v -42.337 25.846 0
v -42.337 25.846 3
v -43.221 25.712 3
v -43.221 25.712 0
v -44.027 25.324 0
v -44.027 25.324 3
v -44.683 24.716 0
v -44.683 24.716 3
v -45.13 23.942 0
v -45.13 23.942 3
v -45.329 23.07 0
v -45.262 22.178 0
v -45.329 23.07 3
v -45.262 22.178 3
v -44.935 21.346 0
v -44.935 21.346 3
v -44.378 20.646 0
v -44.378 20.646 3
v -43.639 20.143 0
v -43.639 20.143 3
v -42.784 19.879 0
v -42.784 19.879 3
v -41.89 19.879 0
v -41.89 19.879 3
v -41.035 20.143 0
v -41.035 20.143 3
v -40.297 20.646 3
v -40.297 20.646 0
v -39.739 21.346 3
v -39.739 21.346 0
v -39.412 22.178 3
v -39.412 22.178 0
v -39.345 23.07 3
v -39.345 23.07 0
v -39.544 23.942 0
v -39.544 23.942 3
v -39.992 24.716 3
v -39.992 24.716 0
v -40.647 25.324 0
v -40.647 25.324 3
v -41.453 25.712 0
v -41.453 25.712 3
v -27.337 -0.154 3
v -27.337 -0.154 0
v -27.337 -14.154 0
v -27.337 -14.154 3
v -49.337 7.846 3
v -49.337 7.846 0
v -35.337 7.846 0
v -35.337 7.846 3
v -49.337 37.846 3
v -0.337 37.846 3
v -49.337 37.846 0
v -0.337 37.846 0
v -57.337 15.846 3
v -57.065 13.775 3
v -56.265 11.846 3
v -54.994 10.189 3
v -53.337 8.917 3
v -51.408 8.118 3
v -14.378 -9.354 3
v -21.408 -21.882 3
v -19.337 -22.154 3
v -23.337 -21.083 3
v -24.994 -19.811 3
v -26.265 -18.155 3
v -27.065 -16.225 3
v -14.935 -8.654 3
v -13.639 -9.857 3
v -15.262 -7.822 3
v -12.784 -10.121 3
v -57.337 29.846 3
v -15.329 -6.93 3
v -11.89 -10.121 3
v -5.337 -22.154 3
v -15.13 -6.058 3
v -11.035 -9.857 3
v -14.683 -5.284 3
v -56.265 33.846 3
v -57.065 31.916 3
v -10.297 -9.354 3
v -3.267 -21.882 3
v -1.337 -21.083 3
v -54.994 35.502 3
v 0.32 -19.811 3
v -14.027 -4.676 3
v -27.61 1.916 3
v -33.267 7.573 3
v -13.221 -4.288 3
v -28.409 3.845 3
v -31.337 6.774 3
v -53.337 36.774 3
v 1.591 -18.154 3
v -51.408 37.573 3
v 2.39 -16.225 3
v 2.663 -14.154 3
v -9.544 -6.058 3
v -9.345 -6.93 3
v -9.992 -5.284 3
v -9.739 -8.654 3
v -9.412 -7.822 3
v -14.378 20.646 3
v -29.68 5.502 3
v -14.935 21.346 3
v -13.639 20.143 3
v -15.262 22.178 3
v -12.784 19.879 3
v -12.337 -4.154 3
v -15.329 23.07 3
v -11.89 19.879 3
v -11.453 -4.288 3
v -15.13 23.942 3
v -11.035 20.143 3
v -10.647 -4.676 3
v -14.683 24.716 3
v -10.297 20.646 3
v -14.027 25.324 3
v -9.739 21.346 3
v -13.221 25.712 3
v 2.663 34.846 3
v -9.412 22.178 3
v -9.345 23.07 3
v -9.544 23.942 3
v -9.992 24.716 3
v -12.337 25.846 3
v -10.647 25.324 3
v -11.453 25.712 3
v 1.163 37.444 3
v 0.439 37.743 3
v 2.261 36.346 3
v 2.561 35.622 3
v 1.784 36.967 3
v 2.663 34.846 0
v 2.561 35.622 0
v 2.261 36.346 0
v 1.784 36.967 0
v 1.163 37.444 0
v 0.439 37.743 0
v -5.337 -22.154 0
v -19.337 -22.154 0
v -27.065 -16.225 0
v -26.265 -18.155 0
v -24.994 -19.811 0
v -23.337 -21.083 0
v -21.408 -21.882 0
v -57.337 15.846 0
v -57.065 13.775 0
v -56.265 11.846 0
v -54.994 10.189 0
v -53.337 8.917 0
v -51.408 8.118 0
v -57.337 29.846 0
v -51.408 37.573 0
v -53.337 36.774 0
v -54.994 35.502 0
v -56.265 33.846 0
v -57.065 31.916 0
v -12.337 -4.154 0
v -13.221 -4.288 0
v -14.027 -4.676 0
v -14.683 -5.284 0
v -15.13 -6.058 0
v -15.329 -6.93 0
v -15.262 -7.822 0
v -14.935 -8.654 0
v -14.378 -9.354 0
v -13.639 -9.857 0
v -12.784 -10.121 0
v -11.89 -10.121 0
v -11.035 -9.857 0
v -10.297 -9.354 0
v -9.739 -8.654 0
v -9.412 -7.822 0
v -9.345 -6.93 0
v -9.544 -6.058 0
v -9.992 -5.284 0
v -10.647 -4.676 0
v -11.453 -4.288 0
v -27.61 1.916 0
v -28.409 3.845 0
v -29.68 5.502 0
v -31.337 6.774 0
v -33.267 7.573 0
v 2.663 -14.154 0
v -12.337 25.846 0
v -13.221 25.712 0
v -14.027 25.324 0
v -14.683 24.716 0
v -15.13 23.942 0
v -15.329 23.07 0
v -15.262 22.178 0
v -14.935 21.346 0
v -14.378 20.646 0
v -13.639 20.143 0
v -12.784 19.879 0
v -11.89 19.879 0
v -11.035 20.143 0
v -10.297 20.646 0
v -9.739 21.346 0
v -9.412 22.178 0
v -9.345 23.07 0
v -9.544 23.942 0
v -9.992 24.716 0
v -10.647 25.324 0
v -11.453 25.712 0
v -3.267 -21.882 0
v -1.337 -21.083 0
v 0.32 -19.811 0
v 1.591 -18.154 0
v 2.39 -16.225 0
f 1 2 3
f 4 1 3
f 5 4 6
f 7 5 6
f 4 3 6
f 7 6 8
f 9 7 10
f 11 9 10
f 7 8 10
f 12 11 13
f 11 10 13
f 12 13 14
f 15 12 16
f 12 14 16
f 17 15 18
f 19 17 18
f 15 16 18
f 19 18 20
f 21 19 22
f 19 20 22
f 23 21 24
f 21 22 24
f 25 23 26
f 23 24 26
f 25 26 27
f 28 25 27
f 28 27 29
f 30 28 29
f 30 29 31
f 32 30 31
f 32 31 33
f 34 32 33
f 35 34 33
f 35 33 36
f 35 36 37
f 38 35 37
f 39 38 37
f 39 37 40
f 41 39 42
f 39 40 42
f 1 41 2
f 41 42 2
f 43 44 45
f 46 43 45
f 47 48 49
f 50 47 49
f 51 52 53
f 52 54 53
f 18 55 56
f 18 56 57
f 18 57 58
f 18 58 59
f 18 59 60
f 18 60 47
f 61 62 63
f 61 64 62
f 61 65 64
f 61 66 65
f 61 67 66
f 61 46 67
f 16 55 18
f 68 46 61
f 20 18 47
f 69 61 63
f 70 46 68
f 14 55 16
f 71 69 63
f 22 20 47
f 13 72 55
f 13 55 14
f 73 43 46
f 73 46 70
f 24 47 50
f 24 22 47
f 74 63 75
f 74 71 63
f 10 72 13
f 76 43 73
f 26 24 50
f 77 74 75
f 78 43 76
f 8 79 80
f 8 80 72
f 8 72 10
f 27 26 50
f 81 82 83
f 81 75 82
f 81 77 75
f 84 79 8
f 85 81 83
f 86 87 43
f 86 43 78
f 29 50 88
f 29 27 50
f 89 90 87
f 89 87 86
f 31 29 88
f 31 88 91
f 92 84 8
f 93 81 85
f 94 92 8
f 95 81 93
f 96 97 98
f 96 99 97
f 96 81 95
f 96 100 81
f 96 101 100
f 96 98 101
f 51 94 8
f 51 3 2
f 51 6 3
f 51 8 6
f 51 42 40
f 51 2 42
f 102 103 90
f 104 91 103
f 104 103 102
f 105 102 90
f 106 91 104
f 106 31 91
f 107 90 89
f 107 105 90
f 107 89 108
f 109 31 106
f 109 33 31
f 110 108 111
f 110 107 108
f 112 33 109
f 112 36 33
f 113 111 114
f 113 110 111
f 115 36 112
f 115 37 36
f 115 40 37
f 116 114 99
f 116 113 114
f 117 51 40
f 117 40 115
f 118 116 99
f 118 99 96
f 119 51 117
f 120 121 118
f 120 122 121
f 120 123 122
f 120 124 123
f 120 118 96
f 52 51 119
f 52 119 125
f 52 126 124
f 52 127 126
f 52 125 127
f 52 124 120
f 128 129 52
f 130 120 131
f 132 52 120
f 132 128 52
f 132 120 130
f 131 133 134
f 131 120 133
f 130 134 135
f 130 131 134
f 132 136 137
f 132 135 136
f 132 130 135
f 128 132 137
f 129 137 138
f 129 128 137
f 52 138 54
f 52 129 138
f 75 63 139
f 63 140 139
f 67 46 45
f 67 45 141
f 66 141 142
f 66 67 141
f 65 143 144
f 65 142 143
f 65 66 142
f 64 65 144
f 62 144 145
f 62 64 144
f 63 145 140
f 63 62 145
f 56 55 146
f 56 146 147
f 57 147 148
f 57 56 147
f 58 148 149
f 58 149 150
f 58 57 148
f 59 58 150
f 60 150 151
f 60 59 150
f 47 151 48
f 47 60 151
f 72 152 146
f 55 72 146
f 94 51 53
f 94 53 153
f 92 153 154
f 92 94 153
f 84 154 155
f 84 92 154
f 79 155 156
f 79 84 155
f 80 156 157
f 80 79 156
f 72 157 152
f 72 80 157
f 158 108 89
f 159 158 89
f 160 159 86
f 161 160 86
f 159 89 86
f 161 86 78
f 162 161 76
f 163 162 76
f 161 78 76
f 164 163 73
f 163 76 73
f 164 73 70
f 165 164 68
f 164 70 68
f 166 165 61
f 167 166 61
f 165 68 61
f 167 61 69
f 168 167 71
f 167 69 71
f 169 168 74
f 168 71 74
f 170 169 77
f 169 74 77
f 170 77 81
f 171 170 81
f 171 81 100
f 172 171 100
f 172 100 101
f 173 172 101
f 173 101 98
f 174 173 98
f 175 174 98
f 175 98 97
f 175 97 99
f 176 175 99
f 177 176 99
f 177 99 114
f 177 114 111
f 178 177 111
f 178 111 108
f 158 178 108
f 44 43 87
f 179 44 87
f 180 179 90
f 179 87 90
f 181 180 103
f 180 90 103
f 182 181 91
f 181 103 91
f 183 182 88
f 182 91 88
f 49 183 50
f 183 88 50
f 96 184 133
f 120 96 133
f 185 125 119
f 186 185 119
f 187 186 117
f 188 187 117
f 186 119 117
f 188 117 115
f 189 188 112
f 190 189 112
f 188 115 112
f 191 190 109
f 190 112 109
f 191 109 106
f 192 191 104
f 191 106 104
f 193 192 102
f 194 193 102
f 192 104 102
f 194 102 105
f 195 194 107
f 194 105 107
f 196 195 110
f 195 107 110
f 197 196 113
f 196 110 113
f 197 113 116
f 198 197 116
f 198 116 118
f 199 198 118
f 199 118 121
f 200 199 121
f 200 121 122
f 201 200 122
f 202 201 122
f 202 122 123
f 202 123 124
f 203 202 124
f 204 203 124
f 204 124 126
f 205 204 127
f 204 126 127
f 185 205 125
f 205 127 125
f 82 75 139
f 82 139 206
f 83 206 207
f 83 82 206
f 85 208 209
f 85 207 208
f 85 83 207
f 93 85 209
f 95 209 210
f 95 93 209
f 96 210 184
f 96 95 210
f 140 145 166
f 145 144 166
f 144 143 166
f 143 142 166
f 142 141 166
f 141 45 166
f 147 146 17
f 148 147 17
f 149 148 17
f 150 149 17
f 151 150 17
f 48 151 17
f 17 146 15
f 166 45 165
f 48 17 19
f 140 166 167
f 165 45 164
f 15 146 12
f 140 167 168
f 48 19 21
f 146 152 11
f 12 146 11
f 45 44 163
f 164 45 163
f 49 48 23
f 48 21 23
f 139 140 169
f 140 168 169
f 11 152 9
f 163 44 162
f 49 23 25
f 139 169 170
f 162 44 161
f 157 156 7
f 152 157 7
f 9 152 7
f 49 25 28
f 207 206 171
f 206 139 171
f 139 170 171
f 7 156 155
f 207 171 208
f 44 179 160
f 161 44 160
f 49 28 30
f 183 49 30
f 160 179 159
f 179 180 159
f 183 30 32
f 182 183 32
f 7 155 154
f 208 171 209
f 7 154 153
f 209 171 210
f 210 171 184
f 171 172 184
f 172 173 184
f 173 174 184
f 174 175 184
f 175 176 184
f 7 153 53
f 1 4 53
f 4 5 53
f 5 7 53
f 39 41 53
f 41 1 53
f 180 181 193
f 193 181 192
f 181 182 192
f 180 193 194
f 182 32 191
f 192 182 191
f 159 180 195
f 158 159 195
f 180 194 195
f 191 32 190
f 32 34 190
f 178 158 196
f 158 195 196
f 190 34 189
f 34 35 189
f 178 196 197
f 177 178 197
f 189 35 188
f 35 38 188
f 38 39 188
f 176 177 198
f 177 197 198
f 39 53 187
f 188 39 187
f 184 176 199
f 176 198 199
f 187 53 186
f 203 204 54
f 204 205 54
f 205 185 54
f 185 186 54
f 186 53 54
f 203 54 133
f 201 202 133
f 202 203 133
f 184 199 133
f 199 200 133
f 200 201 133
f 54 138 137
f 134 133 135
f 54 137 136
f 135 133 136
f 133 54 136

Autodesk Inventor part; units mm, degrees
ref_plane "YZ Plane" through (0, 0, 0) normal (1, 0, 0) x (0, 1, 0)
ref_plane "XZ Plane" through (0, 0, 0) normal (0, 1, 0) x (-1, 0, 0)
ref_plane "XY Plane" through (0, 0, 0) normal (0, 0, 1) x (1, 0, 0)
sketch "Szkic1" plane through (0, 0, 0) normal (0, 0, 1) x (1, 0, 0)
  line L0 (-57.3371, 37.8455) -> (-57.3371, 7.8455)
  line L1 (-57.3371, 7.8455) -> (-27.3371, 7.8455)
  line L2 (-27.3371, 7.8455) -> (-27.3371, -22.1545)
  line L3 (-27.3371, -22.1545) -> (2.6629, -22.1545)
  line L4 (2.6629, -22.1545) -> (2.6629, 37.8455)
  line L5 (2.6629, 37.8455) -> (-57.3371, 37.8455)
  point P0 (0, 0)
  point P1 (-42.3371, 22.8455)
  point P2 (-12.3371, 22.8455)
  point P3 (-12.3371, -7.1545)
  dimension "d0" = 30
  dimension "d1" = 30
  dimension "d2" = 30
  dimension "d3" = 30
  dimension "d4" = 15
  dimension "d5" = 15
  dimension "d6" = 15
  dimension "d7" = 15
  dimension "d8" = 15
  dimension "d9" = 15
extrude "Wyciągnięcie proste1" add sketch "Szkic1" along normal blind 3
hole "Otwór1" at (-42.3371, 22.8455, 0) at (-12.3371, 22.8455, 0) at (-12.3371, -7.1545, 0) direction (0, 0, 1) diameter 6 end through all
fillet "Zaokrąglenie2" radius 3 1 edges at (2.6629, 37.8455, 1.5)
fillet "Zaokrąglenie3" radius 8 5 edges at (2.6629, -22.1545, 1.5) (-27.3371, -22.1545, 1.5) (-27.3371, 7.8455, 1.5) (-57.3371, 7.8455, 1.5) (-57.3371, 37.8455, 1.5)
equation "\"d1\" = d0"
equation "\"d3\" = d2"
equation "\"d4\" = 0.5 * d0"
equation "\"d5\" = 0.5 * d1"
equation "\"d6\" = d5"
equation "\"d7\" = d5"
equation "\"d8\" = 0.5 * d3"
equation "\"d9\" = 0.5 * d2"
properties part number "LC_ALU_3mm_30x30_Corner_Bracket"
